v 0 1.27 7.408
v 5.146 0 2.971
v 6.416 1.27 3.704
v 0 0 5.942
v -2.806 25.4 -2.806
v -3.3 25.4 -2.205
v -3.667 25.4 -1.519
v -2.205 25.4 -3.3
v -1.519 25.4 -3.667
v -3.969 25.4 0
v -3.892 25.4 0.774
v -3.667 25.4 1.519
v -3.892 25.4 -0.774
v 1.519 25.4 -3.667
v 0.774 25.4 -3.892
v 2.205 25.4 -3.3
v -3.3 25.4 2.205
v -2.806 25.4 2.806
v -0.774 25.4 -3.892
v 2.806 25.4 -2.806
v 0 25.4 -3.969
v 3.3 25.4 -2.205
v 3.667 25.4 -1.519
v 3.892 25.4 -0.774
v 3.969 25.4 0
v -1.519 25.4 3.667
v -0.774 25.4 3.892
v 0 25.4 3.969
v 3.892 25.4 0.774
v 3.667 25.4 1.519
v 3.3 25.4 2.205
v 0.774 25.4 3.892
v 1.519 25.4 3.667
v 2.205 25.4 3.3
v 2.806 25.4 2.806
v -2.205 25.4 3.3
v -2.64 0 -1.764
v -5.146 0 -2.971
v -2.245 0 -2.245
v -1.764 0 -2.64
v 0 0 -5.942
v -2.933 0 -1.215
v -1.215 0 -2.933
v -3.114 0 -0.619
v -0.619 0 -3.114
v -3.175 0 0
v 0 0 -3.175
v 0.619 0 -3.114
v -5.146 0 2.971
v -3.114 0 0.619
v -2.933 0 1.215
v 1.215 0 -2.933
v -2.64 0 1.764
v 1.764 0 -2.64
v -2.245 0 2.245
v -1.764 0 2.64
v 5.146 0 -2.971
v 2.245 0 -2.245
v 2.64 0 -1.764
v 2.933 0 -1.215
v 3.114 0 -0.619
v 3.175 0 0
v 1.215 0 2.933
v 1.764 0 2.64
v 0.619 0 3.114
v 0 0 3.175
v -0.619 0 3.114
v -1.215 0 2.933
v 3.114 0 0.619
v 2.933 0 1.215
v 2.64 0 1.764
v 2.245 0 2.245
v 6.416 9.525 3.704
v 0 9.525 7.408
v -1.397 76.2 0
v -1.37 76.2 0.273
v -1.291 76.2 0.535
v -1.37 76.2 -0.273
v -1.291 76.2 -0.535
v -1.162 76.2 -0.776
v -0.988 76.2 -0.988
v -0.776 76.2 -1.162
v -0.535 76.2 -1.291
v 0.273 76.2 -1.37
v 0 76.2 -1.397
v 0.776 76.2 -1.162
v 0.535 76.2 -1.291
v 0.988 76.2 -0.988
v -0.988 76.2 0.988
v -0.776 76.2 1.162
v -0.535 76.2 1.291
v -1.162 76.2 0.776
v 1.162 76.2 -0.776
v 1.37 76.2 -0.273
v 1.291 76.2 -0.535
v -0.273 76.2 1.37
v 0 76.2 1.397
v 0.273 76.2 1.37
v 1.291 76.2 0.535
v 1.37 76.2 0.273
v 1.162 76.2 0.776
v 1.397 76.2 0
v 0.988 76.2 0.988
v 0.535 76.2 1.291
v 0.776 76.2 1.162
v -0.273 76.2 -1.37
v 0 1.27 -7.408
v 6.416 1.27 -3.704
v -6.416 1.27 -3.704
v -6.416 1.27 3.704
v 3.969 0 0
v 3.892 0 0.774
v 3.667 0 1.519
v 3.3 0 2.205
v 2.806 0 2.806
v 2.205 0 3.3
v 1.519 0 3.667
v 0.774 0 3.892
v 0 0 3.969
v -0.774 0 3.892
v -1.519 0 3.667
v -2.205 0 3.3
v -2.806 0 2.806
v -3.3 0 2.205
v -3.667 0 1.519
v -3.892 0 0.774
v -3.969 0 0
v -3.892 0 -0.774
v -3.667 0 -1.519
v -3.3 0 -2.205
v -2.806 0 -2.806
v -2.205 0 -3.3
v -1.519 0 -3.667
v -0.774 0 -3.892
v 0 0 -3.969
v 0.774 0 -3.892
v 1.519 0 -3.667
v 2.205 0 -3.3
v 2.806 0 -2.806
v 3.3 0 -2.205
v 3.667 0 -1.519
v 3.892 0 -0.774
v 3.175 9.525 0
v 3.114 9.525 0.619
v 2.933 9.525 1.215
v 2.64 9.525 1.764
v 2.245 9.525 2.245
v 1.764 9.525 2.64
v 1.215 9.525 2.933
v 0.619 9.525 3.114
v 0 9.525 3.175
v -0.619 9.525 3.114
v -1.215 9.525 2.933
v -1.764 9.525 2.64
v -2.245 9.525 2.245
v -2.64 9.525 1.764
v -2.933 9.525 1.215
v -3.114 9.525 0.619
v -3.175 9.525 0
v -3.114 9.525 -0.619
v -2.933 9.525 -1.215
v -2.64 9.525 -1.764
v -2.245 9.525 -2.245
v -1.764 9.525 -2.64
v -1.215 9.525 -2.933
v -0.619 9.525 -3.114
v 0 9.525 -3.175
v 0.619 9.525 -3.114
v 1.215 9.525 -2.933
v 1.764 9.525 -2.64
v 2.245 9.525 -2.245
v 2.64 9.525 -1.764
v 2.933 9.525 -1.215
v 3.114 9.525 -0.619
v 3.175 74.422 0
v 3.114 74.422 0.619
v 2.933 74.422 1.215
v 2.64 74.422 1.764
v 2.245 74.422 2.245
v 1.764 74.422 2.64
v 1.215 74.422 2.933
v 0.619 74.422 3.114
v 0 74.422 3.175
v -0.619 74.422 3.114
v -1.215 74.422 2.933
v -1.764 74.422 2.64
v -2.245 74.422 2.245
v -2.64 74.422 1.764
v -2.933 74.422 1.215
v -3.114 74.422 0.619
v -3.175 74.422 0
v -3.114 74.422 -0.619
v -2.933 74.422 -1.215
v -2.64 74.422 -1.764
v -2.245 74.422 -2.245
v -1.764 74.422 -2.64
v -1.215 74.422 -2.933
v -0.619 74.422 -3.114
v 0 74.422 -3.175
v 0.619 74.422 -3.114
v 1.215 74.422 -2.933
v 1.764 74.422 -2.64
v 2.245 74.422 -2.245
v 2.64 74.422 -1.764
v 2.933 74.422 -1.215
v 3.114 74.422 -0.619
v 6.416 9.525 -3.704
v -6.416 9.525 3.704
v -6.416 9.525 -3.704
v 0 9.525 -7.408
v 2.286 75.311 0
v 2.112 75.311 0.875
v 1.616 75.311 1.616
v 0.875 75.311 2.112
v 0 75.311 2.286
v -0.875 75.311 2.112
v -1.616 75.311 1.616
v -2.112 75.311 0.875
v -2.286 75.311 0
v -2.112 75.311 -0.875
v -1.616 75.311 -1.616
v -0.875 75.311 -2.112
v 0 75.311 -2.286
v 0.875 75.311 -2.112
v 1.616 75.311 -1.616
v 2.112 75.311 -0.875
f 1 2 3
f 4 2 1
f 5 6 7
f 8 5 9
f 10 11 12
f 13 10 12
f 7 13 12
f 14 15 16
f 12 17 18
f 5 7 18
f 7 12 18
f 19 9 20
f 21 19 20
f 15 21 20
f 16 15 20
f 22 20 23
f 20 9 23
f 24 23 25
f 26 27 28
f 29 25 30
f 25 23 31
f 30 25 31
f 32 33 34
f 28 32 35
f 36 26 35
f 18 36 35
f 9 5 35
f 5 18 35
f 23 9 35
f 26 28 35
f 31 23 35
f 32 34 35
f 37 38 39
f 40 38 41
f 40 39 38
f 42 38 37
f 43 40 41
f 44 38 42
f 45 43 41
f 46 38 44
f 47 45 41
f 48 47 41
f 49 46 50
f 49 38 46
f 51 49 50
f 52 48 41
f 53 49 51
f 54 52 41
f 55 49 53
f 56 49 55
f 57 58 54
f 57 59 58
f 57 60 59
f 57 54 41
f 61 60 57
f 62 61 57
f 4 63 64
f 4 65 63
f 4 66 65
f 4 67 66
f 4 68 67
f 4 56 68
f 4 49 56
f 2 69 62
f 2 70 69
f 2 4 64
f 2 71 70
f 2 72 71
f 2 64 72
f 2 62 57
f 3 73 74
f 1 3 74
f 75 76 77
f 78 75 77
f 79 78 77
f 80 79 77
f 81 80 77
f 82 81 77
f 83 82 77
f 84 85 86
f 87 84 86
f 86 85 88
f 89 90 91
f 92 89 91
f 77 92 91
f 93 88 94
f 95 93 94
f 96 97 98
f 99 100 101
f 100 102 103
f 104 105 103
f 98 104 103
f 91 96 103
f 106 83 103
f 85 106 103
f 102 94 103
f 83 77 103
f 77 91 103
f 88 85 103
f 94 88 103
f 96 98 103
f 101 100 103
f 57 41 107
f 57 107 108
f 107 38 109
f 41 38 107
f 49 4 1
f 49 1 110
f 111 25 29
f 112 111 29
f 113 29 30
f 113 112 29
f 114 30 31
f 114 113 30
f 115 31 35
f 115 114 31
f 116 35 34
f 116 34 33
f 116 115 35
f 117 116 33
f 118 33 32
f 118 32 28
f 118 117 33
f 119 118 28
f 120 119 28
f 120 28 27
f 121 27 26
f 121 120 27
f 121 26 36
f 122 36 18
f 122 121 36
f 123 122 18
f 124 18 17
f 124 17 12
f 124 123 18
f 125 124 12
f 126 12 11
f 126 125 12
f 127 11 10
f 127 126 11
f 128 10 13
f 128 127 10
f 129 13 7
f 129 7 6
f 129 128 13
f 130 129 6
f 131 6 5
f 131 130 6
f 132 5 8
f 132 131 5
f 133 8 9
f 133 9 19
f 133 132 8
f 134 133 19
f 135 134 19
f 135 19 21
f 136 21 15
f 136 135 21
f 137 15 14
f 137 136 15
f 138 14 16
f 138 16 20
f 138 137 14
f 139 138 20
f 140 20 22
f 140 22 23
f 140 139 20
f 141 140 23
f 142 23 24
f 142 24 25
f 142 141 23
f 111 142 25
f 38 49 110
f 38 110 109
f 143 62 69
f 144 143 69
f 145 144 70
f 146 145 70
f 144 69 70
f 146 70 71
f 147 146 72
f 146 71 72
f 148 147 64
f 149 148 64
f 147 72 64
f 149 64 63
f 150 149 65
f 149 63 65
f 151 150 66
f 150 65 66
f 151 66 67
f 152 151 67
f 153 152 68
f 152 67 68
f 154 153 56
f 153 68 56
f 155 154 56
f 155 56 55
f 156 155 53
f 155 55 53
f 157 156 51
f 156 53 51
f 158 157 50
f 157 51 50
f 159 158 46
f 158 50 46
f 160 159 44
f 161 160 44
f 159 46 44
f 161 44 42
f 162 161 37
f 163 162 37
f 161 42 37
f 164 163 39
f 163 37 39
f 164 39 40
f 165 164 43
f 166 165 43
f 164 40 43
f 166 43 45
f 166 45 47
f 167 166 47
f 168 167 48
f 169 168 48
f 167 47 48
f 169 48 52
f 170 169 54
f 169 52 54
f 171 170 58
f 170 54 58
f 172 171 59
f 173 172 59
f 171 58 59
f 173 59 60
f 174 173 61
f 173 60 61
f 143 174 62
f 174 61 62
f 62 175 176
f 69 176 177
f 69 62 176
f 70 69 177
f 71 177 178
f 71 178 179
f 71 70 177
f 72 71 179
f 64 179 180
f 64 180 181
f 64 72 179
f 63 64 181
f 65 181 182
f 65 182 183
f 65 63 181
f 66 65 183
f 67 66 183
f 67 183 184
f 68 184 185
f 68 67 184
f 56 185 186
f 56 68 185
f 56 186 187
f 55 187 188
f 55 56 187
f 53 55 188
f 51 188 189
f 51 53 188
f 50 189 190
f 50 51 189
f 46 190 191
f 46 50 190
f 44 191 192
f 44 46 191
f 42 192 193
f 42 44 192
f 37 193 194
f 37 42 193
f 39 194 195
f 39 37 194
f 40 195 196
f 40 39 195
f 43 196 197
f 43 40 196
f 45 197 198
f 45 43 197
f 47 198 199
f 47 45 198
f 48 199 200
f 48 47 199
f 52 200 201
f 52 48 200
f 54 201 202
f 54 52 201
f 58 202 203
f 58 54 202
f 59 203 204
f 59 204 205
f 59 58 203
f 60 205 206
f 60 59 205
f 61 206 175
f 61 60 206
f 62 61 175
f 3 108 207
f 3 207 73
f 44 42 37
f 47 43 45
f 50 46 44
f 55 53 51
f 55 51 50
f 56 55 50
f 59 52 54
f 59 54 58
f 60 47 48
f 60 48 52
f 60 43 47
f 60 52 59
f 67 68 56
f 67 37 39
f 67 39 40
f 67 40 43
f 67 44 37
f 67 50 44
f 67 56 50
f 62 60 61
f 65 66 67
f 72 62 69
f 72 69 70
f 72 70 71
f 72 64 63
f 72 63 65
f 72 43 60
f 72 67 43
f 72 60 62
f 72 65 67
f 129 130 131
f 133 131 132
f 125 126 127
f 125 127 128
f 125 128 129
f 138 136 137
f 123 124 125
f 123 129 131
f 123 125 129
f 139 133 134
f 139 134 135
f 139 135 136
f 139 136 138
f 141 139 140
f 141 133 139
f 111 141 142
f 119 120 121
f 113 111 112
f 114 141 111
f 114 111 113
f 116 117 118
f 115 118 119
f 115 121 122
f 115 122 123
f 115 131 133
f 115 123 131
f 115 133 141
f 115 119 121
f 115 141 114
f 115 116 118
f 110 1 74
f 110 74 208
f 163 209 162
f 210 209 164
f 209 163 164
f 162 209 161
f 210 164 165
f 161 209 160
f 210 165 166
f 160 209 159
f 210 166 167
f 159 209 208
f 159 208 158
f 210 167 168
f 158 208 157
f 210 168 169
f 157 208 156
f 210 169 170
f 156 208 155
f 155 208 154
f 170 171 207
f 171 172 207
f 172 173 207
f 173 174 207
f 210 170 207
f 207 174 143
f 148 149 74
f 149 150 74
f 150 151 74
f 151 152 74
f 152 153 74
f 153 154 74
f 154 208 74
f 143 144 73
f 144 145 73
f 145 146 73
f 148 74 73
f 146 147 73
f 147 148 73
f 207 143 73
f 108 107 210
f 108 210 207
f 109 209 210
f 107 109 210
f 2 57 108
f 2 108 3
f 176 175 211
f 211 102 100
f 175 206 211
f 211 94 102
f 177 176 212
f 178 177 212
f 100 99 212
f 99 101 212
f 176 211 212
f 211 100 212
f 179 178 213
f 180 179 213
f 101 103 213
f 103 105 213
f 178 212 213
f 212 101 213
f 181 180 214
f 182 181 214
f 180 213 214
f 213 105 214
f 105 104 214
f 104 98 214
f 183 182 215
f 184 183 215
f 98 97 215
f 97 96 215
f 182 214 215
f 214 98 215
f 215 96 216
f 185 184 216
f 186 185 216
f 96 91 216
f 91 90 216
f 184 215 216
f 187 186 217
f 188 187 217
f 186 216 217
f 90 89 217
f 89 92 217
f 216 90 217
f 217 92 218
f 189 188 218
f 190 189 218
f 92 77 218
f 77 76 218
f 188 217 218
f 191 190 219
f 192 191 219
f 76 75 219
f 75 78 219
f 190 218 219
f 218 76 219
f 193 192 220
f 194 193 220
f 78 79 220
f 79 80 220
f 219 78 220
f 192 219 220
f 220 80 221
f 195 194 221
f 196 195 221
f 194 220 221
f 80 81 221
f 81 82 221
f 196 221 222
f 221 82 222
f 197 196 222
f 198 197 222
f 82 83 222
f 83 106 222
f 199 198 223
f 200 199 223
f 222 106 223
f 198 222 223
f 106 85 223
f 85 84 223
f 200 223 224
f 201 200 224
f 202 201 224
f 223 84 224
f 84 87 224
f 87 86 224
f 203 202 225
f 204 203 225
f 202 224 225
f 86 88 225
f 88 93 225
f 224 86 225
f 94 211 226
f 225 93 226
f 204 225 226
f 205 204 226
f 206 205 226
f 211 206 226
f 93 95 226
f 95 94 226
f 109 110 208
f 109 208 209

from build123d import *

# Parameters (mm, degrees)
F0_R     = 3.175
F1_DEPTH = 76.2
F2_DEPTH = 9.525
F3_SIZE  = 1.27
F4_R     = 3.96875
F5_DEPTH = 25.4
F6_SIZE  = 1.778


with BuildPart() as f1:
    # F0 (on Front) → F1 (new body)
    with BuildSketch(Plane.XZ):
        Circle(F0_R)
    extrude(amount=-F1_DEPTH)

    # F6
    f6_edges = [f1.edges().sort_by_distance(p)[0] for p in [
        (-3.175, 76.2, 0),
    ]]
    chamfer(f6_edges, length=F6_SIZE)


with BuildPart() as f2:
    # F0 (on Front) → F2 (new body)
    with BuildSketch(Plane.XZ):
        Polygon((6.415805, -3.704167), (6.415805, 3.704167), (0, 7.408333), (-6.415805, 3.704167), (-6.415805, -3.704167), (0, -7.408333), align=None)
        Circle(F0_R, mode=Mode.SUBTRACT)
    extrude(amount=-F2_DEPTH)

    # F3
    f3_edges = [f2.edges().sort_by_distance(p)[0] for p in [
        (-6.415805, 0, 0),
        (-3.207902, 0, -5.55625),
        (3.207902, 0, -5.55625),
        (6.415805, 0, 0),
        (3.207902, 0, 5.55625),
        (-3.207902, 0, 5.55625),
    ]]
    chamfer(f3_edges, length=F3_SIZE)


with BuildPart() as f5:
    # F4 (on Front) → F5 (new body)
    with BuildSketch(Plane.XZ):
        Circle(F4_R)
    extrude(amount=-F5_DEPTH)


solid = Compound([f1.part, f2.part, f5.part])
